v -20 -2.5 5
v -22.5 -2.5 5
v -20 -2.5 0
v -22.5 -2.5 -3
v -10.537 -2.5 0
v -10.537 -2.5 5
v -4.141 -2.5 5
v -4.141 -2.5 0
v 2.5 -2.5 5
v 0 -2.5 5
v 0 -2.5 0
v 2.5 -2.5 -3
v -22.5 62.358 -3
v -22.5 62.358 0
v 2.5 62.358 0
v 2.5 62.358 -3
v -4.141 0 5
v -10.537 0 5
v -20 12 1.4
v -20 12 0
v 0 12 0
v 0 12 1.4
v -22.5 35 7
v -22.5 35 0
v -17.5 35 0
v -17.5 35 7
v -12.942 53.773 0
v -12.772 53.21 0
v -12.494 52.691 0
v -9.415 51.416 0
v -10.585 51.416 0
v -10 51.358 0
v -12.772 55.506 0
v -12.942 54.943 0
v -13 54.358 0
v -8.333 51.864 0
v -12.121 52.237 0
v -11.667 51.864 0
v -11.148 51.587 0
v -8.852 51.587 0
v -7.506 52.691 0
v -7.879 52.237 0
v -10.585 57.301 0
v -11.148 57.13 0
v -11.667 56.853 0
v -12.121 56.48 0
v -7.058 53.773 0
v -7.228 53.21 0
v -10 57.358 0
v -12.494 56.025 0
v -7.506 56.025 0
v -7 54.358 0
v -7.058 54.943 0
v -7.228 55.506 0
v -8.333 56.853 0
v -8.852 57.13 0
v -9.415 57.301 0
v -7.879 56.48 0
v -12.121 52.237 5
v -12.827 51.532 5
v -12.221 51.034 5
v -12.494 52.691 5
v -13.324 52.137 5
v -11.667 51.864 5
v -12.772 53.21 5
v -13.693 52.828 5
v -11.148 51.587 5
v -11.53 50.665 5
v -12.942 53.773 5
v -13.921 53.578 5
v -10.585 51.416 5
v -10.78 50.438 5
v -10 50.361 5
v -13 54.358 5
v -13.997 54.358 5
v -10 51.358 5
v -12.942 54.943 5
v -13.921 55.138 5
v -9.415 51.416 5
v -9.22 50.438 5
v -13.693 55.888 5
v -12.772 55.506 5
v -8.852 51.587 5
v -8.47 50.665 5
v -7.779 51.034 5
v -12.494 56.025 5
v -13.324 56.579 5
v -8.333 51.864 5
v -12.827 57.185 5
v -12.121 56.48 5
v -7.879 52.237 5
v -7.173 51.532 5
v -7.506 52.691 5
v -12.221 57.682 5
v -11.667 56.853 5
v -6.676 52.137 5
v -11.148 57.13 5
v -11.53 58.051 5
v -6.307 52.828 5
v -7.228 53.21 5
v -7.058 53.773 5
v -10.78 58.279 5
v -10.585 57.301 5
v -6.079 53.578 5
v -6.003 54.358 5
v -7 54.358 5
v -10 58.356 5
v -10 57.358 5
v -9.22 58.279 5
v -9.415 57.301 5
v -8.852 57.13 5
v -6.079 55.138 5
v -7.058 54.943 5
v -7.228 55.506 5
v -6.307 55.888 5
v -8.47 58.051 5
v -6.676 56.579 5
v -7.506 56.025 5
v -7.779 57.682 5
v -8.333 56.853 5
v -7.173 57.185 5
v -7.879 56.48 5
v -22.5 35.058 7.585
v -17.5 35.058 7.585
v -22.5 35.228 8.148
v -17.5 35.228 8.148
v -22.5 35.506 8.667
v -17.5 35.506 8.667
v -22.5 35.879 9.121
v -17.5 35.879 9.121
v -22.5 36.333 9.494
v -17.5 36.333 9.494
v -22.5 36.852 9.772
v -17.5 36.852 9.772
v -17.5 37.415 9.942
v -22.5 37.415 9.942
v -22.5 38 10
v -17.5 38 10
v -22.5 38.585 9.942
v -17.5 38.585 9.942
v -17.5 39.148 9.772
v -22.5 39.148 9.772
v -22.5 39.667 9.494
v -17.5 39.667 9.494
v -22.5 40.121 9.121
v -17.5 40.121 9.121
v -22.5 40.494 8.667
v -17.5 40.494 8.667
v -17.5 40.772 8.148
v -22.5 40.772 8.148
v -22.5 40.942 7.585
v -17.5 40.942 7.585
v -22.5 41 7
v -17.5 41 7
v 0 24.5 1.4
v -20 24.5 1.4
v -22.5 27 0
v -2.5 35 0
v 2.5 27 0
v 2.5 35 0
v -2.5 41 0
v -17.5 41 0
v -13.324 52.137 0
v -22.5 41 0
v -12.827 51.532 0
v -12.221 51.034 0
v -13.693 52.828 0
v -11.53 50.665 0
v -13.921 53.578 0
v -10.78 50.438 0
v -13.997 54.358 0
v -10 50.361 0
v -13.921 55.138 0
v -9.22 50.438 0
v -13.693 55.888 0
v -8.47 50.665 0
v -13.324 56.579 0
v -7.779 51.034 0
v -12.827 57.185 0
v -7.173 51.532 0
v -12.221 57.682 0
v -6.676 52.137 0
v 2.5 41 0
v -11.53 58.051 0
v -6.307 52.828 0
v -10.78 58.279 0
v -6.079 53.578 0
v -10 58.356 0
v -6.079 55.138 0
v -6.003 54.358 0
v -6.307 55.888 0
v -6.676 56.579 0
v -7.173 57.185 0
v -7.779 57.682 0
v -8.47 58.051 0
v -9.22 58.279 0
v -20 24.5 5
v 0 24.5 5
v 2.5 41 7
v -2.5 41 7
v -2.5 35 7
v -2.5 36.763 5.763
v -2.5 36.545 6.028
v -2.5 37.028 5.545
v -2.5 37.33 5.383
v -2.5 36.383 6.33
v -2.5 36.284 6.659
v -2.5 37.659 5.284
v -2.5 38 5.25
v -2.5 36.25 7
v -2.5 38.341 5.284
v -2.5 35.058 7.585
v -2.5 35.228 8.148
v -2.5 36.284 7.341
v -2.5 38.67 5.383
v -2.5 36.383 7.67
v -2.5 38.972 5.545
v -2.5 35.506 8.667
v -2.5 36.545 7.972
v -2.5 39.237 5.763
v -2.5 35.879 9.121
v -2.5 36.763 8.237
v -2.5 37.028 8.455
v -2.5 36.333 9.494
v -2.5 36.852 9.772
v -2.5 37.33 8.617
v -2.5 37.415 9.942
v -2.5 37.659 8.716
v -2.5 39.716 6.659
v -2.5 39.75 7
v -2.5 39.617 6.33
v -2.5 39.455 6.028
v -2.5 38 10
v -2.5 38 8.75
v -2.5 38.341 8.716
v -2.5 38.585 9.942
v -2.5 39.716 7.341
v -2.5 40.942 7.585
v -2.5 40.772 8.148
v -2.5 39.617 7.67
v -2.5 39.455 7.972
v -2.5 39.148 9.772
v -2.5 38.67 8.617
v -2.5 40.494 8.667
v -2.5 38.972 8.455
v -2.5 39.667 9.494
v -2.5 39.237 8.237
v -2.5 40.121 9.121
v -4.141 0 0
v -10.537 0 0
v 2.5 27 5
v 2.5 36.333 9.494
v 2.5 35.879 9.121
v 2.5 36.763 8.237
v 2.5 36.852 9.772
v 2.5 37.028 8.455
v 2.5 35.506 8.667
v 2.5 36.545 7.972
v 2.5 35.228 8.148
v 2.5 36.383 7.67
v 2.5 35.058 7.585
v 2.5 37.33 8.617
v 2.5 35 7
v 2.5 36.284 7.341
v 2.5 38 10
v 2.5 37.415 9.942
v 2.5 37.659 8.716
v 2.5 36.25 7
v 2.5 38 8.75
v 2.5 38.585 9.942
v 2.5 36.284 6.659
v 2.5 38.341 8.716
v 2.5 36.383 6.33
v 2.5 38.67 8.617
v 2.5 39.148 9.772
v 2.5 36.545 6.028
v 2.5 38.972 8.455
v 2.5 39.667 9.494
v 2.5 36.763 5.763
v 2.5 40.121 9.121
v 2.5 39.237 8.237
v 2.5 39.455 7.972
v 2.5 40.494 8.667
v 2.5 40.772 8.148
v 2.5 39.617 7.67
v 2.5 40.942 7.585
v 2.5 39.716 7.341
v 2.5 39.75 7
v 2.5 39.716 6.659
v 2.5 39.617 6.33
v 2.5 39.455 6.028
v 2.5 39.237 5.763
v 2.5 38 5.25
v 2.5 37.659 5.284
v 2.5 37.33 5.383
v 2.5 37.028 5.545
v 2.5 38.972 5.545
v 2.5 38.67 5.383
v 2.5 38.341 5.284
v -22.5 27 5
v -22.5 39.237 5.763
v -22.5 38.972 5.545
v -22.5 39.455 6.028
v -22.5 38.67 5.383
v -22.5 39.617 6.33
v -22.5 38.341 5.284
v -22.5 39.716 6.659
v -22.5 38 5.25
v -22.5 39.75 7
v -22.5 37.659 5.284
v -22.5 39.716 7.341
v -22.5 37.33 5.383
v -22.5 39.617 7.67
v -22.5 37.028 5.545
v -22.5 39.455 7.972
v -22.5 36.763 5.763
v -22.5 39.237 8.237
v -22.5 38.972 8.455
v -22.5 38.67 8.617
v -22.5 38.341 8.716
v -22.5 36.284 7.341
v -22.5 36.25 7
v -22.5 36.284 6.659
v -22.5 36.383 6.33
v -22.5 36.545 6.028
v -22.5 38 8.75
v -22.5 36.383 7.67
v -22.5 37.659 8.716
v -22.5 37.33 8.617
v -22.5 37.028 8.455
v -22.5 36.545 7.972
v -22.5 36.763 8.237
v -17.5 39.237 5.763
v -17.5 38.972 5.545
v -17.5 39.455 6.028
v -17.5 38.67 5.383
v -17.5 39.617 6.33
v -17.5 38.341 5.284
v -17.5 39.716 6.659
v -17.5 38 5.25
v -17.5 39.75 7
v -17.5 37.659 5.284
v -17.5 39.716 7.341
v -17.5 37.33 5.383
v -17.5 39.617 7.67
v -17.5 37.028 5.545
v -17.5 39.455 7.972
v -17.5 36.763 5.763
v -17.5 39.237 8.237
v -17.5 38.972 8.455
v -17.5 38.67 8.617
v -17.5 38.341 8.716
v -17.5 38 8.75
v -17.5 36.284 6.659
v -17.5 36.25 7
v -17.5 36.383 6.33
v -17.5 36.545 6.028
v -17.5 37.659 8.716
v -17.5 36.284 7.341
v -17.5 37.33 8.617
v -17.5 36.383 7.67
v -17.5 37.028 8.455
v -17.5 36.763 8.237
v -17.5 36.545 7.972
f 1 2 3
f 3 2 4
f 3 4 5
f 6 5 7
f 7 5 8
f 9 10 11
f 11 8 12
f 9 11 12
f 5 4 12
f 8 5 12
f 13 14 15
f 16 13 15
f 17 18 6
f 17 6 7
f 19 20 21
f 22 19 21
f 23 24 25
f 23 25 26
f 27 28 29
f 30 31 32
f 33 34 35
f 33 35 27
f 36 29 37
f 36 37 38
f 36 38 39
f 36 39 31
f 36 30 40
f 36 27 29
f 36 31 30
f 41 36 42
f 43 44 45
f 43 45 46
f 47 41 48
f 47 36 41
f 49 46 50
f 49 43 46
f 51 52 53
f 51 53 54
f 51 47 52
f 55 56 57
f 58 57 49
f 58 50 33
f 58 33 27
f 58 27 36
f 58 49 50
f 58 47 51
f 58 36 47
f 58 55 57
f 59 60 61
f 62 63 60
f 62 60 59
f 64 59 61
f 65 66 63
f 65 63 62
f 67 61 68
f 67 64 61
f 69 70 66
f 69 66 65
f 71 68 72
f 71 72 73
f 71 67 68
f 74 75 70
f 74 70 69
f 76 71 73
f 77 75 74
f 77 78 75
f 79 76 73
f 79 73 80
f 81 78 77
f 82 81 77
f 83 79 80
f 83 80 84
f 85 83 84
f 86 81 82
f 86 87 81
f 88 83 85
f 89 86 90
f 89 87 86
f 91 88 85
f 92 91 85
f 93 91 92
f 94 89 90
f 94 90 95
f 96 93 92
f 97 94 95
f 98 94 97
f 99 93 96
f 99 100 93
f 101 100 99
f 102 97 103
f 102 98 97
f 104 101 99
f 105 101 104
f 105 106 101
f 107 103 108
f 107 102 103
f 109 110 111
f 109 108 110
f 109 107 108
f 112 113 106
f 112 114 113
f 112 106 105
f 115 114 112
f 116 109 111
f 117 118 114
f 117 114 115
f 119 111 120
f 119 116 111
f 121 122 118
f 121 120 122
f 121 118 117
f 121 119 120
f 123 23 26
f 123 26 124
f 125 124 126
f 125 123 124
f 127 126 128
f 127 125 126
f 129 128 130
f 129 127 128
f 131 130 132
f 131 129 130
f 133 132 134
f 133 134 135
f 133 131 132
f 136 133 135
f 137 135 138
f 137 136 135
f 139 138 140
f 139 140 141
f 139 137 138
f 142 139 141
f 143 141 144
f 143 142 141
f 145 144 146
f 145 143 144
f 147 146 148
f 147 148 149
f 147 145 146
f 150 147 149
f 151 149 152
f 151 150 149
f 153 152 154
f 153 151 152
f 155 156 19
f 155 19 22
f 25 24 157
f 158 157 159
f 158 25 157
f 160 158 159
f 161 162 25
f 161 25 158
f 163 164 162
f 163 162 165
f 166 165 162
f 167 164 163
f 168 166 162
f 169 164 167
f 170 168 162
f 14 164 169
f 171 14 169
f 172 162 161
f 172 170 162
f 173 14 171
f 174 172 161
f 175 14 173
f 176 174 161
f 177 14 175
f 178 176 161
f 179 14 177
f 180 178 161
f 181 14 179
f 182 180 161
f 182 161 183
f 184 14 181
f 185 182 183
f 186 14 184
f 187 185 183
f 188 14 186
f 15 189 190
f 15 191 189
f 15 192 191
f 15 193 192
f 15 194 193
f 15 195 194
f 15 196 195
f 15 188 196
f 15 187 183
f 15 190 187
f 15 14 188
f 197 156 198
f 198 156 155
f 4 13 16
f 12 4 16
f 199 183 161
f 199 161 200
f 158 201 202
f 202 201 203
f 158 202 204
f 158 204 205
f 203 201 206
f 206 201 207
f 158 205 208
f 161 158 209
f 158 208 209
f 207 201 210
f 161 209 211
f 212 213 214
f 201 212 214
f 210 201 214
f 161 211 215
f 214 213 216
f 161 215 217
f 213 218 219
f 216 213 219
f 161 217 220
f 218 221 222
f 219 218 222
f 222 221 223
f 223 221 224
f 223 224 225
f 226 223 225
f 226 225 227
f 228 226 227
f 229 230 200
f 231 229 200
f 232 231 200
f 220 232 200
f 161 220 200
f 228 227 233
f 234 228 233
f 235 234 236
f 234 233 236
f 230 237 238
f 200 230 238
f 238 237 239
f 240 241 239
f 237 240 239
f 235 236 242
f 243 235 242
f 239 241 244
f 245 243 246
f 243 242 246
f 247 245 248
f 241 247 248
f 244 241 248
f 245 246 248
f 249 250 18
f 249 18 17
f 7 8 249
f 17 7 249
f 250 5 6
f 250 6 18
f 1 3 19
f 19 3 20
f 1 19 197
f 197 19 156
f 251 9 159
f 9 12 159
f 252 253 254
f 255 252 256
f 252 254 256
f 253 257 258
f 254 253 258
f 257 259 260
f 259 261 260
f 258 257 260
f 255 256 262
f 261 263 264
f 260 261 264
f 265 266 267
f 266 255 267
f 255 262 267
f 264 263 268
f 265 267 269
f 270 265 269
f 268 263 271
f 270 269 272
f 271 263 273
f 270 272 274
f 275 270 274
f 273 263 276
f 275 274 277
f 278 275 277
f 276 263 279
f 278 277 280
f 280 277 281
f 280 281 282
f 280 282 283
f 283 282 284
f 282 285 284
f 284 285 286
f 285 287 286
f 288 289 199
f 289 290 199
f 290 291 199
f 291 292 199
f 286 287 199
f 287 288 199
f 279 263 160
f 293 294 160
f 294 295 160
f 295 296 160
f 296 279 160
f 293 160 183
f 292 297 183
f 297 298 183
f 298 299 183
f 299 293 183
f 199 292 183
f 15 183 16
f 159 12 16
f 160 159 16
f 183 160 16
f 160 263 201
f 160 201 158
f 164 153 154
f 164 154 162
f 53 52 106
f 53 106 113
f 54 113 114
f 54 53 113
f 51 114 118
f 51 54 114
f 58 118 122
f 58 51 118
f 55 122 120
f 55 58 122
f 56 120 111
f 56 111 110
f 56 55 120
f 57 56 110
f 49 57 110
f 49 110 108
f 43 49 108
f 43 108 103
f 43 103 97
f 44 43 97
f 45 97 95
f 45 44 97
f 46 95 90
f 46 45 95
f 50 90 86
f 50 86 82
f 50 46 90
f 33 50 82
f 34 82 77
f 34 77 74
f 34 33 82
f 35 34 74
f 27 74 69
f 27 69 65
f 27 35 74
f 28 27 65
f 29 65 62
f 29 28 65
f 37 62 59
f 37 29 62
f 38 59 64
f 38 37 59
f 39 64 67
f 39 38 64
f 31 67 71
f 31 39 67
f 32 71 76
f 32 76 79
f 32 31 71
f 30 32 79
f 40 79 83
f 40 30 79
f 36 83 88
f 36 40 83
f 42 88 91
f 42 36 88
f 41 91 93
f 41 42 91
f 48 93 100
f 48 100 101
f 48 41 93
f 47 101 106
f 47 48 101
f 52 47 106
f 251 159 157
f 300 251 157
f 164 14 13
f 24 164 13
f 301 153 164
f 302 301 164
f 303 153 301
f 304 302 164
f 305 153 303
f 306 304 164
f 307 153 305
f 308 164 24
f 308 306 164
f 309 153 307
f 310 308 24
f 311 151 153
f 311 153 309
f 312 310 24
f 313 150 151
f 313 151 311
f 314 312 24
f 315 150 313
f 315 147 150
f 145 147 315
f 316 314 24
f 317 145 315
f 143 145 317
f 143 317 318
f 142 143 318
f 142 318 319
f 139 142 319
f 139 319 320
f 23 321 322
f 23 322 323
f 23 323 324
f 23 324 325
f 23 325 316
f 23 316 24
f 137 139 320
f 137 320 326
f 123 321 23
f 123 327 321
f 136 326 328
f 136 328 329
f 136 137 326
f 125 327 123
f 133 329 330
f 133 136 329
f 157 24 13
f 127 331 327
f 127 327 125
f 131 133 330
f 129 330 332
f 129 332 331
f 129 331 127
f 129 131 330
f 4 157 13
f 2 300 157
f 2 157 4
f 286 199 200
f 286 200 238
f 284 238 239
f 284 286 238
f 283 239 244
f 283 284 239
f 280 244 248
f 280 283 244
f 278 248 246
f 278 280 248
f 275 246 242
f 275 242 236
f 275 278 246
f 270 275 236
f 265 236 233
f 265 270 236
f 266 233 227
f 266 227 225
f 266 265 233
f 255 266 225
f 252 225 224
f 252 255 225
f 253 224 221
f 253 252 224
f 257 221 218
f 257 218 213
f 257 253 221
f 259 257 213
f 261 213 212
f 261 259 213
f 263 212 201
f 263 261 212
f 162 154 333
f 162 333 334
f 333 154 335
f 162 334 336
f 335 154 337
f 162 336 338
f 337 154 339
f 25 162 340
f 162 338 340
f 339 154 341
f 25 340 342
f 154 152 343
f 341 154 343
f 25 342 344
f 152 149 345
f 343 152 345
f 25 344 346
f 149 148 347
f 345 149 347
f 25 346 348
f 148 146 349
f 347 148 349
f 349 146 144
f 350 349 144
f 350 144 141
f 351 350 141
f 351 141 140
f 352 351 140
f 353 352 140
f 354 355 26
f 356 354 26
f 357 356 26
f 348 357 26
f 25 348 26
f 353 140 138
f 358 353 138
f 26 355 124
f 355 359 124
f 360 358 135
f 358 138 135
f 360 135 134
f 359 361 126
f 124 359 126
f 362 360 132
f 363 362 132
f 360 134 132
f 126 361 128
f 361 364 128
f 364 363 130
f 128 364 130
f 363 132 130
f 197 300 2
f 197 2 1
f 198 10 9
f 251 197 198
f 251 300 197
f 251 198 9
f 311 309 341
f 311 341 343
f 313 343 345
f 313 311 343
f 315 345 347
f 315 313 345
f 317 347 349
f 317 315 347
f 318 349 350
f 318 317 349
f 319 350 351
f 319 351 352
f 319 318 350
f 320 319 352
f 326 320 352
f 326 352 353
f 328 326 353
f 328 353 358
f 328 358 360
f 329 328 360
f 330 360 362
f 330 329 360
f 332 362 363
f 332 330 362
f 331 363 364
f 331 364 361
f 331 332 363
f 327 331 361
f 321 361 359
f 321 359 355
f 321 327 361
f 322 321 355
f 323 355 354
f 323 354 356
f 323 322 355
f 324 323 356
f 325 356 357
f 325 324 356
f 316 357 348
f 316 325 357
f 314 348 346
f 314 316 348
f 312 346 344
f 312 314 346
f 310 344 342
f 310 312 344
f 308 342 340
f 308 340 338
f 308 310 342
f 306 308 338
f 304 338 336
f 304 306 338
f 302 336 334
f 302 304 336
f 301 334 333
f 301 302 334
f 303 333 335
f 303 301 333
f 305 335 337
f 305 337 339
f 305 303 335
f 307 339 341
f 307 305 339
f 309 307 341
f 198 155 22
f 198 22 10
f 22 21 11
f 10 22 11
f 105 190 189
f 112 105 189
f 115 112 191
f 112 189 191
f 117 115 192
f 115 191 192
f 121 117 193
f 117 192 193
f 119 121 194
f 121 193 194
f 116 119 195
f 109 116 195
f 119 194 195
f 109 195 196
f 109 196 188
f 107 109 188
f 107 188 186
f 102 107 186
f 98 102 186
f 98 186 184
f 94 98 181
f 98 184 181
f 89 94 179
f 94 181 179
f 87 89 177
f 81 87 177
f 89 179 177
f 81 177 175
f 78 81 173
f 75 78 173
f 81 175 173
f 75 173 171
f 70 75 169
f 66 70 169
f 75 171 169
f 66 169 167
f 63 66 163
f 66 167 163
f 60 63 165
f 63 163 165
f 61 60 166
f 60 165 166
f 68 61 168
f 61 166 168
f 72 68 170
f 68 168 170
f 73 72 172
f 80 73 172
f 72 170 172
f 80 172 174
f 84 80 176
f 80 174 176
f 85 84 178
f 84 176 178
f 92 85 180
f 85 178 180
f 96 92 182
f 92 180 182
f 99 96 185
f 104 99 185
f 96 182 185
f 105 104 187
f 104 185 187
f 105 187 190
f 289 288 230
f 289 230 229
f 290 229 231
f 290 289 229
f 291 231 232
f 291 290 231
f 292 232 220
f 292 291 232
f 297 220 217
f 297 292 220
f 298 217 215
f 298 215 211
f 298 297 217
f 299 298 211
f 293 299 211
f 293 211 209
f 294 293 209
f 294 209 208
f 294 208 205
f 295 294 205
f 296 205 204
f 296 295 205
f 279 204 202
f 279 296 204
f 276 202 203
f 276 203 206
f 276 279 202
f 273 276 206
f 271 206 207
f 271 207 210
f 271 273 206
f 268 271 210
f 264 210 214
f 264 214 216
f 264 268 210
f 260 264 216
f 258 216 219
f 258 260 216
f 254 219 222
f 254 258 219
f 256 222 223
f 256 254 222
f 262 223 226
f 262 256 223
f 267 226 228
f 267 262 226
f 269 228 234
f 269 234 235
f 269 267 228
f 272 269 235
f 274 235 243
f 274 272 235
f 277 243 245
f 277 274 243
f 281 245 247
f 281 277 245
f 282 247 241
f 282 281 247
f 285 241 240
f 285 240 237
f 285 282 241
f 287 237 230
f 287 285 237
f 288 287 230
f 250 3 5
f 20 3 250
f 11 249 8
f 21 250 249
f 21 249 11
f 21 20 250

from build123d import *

# Parameters (mm, degrees)
F0_W      = 4.1414871812
F0_H      = 2.5
F0_W_2    = 6.3956826925
F0_W_3    = 4.0508699417
F0_W_4    = 5.4119601846
F0_W_5    = 25
F0_H_2    = 35.3582080007
F0_R      = 3.9974062239
F0_W_6    = 20
F0_H_3    = 12.5
F1_DEPTH  = 3
F2_DEPTH  = 5
F3_DEPTH  = 1.4
F0_R_2    = 3
F4_DEPTH  = 5
F5_DEPTH  = 3
F7_DEPTH  = 5
F9_DEPTH  = 5
F10_R     = 3
F11_DEPTH = 2


with BuildPart() as f1:
    # F0 (on Top) → F1 (new body)
    with BuildSketch(Plane.XY):
        with Locations((-2.0707435906, -1.25)):
            Rectangle(F0_W, F0_H)
        with Locations((-7.3393285275, -1.25)):
            Rectangle(F0_W_2, F0_H)
        with Locations((-17.9745650291, -1.25)):
            Rectangle(F0_W_3, F0_H)
        with Locations((-13.243149966, -1.25)):
            Rectangle(F0_W_4, F0_H)
        Polygon((0, 12), (0, 0), (0, -2.5), (2.5, -2.5), (2.5, 27), (-22.5, 27), (-22.5, -2.5), (-20, -2.5), (-20, 0), (-20, 12), (-20, 24.5), (0, 24.5), align=None)
        with Locations((-10, 44.6791040003)):
            Rectangle(F0_W_5, F0_H_2)
        with Locations((-10, 54.3582080007)):
            Circle(F0_R, mode=Mode.SUBTRACT)
        with Locations((-10, 18.25)):
            Rectangle(F0_W_6, F0_H_3)
        Polygon((-4.1414871812, 0), (0, 0), (0, 12), (-20, 12), (-20, 0), (-15.9491300583, 0), (-10.5371698737, 0), align=None)
    extrude(amount=-F1_DEPTH)

    # F0 (on Top) → F2 (join)
    with BuildSketch(Plane.XY):
        Polygon((0, 12), (0, 0), (0, -2.5), (2.5, -2.5), (2.5, 27), (-22.5, 27), (-22.5, -2.5), (-20, -2.5), (-20, 0), (-20, 12), (-20, 24.5), (0, 24.5), align=None)
        with Locations((-7.3393285275, -1.25)):
            Rectangle(F0_W_2, F0_H)
    extrude(amount=F2_DEPTH)

    # F0 (on Top) → F3 (join)
    with BuildSketch(Plane.XY):
        with Locations((-10, 18.25)):
            Rectangle(F0_W_6, F0_H_3)
    extrude(amount=F3_DEPTH)

    # F0 (on Top) → F4 (join)
    with BuildSketch(Plane.XY):
        with Locations((-10, 54.3582080007)):
            Circle(F0_R)
        with Locations((-10, 54.3582080007)):
            Circle(F0_R_2, mode=Mode.SUBTRACT)
    extrude(amount=F4_DEPTH)

    # F0 (on Top) → F5 (join)
    with BuildSketch(Plane.XY):
        with Locations((-10, 54.3582080007)):
            Circle(F0_R)
        with Locations((-10, 54.3582080007)):
            Circle(F0_R_2, mode=Mode.SUBTRACT)
        with Locations((-10, 54.3582080007)):
            Circle(F0_R_2)
    extrude(amount=-F5_DEPTH)

    # F6 (on face) → F7 (join)
    with BuildSketch(Plane.YZ.offset(2.5)):
        with BuildLine():
            ThreePointArc((41, 7), (38, 10), (35, 7))
            Line((35, 7), (36.25, 7))
            ThreePointArc((36.25, 7), (38, 8.75), (39.75, 7))
            Line((39.75, 7), (41, 7))
        make_face()
        with BuildLine():
            Line((35, 7), (35, 0))
            Line((35, 0), (41, 0))
            Line((41, 0), (41, 7))
            Line((41, 7), (39.75, 7))
            ThreePointArc((39.75, 7), (38, 5.25), (36.25, 7))
            Line((36.25, 7), (35, 7))
        make_face()
    extrude(amount=-F7_DEPTH)

    # F8 (on face) → F9 (join)
    with BuildSketch(Plane(origin=(-22.5, 0, 0), x_dir=(0, -1, 0), z_dir=(-1, 0, 0))):
        with BuildLine():
            Line((-41, 7), (-41, 0))
            Line((-41, 0), (-35, 0))
            Line((-35, 0), (-35, 7))
            Line((-35, 7), (-36.25, 7))
            ThreePointArc((-36.25, 7), (-38, 5.25), (-39.75, 7))
            Line((-39.75, 7), (-41, 7))
        make_face()
        with BuildLine():
            ThreePointArc((-35, 7), (-38, 10), (-41, 7))
            Line((-41, 7), (-39.75, 7))
            ThreePointArc((-39.75, 7), (-38, 8.75), (-36.25, 7))
            Line((-36.25, 7), (-35, 7))
        make_face()
    extrude(amount=-F9_DEPTH)

    # F10 (on face) → F11 (join)
    with BuildSketch(Plane(origin=(0, 0, -3), x_dir=(1, 0, 0), z_dir=(0, 0, -1))):
        with Locations((-10, -54.3582080007)):
            Circle(F10_R)
    extrude(amount=-F11_DEPTH)


solid = f1.part
